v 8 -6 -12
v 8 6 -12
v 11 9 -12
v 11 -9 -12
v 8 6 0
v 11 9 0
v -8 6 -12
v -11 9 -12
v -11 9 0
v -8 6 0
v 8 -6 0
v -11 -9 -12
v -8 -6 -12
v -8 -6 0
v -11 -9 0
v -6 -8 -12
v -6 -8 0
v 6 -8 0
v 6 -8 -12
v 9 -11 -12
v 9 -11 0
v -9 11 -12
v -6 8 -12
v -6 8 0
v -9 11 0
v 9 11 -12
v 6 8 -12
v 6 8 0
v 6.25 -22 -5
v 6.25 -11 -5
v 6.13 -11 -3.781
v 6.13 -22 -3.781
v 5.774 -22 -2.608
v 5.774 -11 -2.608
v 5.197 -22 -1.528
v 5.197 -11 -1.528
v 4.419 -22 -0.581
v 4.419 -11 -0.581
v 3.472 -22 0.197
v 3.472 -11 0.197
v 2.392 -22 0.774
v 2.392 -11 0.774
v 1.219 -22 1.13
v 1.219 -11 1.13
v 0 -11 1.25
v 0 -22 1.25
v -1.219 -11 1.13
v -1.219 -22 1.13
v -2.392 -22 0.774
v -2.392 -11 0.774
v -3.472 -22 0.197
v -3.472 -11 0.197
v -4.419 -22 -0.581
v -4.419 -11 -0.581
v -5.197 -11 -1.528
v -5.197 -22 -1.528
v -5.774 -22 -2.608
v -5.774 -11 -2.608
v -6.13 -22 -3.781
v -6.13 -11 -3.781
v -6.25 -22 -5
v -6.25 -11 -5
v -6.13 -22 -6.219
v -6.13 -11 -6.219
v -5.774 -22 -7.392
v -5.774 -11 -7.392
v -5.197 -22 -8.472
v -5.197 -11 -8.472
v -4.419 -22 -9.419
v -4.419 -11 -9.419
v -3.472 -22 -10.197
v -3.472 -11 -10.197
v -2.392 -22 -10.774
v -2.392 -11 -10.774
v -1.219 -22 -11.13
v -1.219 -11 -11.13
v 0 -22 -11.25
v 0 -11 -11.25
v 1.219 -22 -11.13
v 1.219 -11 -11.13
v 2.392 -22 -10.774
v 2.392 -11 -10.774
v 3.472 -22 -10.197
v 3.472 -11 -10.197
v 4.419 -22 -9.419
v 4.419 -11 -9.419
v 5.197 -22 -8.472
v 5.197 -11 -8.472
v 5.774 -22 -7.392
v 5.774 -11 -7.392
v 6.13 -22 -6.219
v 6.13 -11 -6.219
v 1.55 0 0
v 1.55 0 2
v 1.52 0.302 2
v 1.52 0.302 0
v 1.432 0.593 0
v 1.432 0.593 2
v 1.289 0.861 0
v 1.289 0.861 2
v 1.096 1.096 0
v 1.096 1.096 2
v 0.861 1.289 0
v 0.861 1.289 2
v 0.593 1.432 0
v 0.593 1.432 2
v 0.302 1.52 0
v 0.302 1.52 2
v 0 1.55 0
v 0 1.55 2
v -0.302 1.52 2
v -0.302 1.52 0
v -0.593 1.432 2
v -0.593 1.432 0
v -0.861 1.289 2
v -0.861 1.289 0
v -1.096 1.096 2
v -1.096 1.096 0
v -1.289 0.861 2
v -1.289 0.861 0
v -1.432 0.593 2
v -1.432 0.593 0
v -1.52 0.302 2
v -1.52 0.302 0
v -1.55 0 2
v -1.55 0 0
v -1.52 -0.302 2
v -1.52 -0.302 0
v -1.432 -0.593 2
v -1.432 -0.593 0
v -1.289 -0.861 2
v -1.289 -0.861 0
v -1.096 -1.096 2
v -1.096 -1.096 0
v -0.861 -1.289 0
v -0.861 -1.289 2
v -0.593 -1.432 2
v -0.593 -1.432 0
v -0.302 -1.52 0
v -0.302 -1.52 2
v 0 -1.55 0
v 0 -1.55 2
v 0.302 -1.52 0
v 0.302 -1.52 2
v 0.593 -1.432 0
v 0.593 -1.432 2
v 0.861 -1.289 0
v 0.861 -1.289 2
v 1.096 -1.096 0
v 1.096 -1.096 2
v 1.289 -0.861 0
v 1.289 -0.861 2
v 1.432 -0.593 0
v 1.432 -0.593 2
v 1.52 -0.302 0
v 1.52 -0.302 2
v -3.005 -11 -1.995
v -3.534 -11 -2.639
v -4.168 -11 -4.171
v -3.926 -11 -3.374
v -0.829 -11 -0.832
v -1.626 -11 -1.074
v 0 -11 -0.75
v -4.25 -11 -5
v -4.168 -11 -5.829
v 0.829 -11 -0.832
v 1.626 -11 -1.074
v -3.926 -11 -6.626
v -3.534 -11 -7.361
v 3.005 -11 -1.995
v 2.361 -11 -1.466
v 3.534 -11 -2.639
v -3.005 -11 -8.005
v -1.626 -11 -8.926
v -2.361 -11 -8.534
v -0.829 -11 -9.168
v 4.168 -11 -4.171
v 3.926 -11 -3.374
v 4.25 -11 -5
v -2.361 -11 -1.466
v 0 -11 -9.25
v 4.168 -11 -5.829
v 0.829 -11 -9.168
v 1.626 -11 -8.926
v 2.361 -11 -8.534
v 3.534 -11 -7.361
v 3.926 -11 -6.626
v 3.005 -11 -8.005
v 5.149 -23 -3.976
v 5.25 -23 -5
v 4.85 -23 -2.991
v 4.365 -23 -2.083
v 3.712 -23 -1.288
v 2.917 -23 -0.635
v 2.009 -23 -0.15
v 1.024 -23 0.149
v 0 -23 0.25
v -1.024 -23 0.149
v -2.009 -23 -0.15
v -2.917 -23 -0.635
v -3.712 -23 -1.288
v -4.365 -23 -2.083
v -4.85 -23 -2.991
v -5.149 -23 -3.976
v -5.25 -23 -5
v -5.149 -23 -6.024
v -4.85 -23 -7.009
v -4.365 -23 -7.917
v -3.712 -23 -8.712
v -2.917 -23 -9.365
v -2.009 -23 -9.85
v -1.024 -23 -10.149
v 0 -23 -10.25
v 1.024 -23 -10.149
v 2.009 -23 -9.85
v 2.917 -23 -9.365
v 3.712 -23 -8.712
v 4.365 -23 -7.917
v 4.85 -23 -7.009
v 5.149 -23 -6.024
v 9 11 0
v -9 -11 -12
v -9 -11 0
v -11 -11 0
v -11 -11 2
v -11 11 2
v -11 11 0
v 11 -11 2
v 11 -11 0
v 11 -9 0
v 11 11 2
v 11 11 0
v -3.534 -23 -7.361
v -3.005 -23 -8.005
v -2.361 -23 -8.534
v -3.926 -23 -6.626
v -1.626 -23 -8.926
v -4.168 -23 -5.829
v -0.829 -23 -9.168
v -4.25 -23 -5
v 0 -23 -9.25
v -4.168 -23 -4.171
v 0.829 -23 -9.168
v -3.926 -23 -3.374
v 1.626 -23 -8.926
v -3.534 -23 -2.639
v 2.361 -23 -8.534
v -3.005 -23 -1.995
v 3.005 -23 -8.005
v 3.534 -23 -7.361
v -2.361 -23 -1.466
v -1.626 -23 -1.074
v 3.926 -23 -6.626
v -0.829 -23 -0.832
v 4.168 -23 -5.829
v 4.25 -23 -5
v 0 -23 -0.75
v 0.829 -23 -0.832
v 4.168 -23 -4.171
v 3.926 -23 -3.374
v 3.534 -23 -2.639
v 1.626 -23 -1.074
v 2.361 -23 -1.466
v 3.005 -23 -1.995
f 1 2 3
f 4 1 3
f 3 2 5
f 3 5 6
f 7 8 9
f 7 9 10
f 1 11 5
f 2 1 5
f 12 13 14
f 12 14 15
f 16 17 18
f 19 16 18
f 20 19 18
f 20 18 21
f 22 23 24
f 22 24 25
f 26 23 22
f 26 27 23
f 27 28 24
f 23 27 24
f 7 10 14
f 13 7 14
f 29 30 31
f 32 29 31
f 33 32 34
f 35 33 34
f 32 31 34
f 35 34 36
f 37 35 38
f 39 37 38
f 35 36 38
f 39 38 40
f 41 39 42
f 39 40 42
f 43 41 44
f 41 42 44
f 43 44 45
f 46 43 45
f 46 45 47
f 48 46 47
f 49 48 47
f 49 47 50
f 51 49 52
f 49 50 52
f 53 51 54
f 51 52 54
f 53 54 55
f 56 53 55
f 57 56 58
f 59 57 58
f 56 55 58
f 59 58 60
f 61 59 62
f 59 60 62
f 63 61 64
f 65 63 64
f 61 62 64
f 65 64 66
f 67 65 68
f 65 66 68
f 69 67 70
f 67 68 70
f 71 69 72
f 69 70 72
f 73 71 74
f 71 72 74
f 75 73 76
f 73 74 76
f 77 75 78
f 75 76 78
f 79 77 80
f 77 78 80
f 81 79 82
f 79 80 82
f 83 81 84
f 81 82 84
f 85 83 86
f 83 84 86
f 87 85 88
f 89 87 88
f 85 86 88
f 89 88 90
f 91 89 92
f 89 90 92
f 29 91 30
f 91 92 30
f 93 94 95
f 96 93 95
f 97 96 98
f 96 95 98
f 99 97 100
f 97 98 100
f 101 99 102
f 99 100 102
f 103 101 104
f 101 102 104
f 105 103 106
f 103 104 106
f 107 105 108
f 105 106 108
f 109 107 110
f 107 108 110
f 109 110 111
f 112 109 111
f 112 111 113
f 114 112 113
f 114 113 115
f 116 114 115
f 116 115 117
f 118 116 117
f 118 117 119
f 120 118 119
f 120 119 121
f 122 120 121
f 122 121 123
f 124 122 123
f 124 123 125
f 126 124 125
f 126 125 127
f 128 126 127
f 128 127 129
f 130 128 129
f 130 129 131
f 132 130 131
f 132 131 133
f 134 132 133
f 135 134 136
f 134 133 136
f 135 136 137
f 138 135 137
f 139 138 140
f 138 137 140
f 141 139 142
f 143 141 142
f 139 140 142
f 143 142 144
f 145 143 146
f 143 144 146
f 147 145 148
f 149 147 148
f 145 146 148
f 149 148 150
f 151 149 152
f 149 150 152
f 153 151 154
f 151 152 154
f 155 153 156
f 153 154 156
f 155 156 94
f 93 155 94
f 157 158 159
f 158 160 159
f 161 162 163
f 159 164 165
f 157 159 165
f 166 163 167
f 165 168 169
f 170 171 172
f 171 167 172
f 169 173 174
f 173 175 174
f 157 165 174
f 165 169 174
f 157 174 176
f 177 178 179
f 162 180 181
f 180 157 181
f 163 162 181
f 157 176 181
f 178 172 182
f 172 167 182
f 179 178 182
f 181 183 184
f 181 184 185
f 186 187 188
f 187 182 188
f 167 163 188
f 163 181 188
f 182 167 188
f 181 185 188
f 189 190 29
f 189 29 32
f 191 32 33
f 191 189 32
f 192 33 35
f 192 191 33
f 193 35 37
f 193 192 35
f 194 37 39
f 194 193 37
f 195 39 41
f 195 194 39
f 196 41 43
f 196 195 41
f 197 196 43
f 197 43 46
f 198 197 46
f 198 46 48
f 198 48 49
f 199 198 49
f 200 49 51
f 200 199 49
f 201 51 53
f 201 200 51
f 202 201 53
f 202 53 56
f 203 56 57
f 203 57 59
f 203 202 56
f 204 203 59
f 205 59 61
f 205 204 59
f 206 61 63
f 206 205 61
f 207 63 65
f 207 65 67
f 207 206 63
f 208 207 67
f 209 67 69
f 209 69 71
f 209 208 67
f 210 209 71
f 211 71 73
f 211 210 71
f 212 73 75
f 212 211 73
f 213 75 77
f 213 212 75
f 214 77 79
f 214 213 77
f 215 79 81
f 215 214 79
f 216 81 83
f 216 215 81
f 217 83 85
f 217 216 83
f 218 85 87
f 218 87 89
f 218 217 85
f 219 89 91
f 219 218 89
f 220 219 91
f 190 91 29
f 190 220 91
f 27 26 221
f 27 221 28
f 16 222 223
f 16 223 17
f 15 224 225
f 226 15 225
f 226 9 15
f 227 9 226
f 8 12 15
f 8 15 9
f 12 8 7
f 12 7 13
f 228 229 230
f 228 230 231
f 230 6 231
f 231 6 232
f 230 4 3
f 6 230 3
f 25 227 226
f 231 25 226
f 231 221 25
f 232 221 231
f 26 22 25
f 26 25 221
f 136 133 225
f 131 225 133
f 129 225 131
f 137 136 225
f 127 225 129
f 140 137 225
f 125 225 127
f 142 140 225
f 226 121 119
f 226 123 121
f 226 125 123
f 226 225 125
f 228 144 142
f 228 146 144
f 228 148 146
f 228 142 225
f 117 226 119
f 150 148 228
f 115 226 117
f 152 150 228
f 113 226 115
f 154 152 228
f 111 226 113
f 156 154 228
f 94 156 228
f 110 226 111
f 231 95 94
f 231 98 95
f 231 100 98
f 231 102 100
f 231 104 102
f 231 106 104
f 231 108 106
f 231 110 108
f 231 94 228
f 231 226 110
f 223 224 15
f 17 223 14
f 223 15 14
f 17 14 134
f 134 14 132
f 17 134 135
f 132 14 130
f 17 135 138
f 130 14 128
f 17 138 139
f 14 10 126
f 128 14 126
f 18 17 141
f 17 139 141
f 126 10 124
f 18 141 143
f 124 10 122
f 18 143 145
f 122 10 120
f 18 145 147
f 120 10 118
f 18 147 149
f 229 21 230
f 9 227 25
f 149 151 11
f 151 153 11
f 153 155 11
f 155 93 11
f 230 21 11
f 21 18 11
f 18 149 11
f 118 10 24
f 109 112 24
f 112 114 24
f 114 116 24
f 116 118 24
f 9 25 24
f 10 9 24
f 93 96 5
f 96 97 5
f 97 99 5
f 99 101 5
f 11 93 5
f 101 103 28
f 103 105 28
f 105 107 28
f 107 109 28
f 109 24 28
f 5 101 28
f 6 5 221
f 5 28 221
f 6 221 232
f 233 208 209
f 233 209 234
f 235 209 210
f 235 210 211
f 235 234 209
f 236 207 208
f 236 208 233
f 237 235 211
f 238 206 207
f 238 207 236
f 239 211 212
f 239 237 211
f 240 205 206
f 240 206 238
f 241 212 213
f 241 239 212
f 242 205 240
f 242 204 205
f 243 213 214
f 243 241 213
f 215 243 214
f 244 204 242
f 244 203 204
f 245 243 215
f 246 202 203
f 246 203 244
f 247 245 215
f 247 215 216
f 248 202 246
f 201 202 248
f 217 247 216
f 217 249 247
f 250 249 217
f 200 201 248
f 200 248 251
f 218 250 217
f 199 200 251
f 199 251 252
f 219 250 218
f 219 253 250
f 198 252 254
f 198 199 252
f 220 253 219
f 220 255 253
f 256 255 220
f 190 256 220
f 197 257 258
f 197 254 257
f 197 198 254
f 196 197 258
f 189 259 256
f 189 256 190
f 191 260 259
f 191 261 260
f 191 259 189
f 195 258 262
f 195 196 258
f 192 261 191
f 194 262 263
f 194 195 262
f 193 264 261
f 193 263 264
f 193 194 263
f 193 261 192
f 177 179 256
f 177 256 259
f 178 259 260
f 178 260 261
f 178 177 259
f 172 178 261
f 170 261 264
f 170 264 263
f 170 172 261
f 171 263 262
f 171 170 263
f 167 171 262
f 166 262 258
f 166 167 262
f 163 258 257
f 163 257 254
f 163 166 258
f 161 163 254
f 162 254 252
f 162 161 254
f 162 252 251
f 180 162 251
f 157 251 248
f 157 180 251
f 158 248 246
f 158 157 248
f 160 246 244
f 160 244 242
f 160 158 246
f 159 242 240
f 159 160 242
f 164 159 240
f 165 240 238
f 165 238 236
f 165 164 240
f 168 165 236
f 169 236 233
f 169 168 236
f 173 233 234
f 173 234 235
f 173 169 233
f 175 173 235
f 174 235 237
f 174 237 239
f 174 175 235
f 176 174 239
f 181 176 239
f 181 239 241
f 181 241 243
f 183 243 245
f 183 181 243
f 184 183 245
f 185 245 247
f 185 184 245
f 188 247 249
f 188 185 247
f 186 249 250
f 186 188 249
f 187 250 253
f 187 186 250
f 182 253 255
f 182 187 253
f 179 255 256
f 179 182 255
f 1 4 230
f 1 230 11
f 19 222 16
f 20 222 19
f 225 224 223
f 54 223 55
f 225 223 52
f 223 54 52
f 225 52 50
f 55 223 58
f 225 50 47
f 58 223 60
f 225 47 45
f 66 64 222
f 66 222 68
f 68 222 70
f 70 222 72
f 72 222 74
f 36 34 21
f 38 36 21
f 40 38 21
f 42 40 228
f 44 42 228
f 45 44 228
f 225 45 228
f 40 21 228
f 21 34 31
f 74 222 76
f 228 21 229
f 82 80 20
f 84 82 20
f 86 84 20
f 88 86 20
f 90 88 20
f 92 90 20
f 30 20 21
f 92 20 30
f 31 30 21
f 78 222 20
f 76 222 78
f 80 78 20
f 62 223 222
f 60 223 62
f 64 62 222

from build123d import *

# Parameters (mm, degrees)
F0_W     = 22
F0_H     = 22
F1_DEPTH = 2
F2_R     = 1.55
F3_DEPTH = 2.001
F5_DEPTH = 12
F6_R     = 6.25
F6_R_2   = 4.25
F7_DEPTH = 12
F8_SIZE  = 1


with BuildPart() as f1:
    # F0 (on Top) → F1 (new body)
    with BuildSketch(Plane.XY):
        Rectangle(F0_W, F0_H)
    extrude(amount=F1_DEPTH)

    # F2 (on face) → F3 (cut, through all)
    with BuildSketch(Plane.XY.offset(2)):
        Circle(F2_R)
    extrude(amount=-F3_DEPTH, mode=Mode.SUBTRACT)

    # F4 (on face) → F5 (join)
    with BuildSketch(Plane(origin=(0, 0, 0), x_dir=(1, 0, 0), z_dir=(0, 0, -1))):
        Polygon((9, 11), (-9, 11), (-6, 8), (6, 8), align=None)
        Polygon((-8, 6), (-11, 9), (-11, -9), (-8, -6), align=None)
        Polygon((-6, -8), (-9, -11), (9, -11), (6, -8), align=None)
        Polygon((8, -6), (11, -9), (11, 9), (8, 6), align=None)
    extrude(amount=F5_DEPTH)

    # F6 (on face) → F7 (join)
    with BuildSketch(Plane.XZ.offset(11)):
        with Locations((0, -5)):
            Circle(F6_R)
        with Locations((0, -5)):
            Circle(F6_R_2, mode=Mode.SUBTRACT)
    extrude(amount=F7_DEPTH)

    # F8
    f8_edges = [f1.edges().sort_by_distance(p)[0] for p in [
        (-6.25, -23, -5),
    ]]
    chamfer(f8_edges, length=F8_SIZE)


solid = f1.part
